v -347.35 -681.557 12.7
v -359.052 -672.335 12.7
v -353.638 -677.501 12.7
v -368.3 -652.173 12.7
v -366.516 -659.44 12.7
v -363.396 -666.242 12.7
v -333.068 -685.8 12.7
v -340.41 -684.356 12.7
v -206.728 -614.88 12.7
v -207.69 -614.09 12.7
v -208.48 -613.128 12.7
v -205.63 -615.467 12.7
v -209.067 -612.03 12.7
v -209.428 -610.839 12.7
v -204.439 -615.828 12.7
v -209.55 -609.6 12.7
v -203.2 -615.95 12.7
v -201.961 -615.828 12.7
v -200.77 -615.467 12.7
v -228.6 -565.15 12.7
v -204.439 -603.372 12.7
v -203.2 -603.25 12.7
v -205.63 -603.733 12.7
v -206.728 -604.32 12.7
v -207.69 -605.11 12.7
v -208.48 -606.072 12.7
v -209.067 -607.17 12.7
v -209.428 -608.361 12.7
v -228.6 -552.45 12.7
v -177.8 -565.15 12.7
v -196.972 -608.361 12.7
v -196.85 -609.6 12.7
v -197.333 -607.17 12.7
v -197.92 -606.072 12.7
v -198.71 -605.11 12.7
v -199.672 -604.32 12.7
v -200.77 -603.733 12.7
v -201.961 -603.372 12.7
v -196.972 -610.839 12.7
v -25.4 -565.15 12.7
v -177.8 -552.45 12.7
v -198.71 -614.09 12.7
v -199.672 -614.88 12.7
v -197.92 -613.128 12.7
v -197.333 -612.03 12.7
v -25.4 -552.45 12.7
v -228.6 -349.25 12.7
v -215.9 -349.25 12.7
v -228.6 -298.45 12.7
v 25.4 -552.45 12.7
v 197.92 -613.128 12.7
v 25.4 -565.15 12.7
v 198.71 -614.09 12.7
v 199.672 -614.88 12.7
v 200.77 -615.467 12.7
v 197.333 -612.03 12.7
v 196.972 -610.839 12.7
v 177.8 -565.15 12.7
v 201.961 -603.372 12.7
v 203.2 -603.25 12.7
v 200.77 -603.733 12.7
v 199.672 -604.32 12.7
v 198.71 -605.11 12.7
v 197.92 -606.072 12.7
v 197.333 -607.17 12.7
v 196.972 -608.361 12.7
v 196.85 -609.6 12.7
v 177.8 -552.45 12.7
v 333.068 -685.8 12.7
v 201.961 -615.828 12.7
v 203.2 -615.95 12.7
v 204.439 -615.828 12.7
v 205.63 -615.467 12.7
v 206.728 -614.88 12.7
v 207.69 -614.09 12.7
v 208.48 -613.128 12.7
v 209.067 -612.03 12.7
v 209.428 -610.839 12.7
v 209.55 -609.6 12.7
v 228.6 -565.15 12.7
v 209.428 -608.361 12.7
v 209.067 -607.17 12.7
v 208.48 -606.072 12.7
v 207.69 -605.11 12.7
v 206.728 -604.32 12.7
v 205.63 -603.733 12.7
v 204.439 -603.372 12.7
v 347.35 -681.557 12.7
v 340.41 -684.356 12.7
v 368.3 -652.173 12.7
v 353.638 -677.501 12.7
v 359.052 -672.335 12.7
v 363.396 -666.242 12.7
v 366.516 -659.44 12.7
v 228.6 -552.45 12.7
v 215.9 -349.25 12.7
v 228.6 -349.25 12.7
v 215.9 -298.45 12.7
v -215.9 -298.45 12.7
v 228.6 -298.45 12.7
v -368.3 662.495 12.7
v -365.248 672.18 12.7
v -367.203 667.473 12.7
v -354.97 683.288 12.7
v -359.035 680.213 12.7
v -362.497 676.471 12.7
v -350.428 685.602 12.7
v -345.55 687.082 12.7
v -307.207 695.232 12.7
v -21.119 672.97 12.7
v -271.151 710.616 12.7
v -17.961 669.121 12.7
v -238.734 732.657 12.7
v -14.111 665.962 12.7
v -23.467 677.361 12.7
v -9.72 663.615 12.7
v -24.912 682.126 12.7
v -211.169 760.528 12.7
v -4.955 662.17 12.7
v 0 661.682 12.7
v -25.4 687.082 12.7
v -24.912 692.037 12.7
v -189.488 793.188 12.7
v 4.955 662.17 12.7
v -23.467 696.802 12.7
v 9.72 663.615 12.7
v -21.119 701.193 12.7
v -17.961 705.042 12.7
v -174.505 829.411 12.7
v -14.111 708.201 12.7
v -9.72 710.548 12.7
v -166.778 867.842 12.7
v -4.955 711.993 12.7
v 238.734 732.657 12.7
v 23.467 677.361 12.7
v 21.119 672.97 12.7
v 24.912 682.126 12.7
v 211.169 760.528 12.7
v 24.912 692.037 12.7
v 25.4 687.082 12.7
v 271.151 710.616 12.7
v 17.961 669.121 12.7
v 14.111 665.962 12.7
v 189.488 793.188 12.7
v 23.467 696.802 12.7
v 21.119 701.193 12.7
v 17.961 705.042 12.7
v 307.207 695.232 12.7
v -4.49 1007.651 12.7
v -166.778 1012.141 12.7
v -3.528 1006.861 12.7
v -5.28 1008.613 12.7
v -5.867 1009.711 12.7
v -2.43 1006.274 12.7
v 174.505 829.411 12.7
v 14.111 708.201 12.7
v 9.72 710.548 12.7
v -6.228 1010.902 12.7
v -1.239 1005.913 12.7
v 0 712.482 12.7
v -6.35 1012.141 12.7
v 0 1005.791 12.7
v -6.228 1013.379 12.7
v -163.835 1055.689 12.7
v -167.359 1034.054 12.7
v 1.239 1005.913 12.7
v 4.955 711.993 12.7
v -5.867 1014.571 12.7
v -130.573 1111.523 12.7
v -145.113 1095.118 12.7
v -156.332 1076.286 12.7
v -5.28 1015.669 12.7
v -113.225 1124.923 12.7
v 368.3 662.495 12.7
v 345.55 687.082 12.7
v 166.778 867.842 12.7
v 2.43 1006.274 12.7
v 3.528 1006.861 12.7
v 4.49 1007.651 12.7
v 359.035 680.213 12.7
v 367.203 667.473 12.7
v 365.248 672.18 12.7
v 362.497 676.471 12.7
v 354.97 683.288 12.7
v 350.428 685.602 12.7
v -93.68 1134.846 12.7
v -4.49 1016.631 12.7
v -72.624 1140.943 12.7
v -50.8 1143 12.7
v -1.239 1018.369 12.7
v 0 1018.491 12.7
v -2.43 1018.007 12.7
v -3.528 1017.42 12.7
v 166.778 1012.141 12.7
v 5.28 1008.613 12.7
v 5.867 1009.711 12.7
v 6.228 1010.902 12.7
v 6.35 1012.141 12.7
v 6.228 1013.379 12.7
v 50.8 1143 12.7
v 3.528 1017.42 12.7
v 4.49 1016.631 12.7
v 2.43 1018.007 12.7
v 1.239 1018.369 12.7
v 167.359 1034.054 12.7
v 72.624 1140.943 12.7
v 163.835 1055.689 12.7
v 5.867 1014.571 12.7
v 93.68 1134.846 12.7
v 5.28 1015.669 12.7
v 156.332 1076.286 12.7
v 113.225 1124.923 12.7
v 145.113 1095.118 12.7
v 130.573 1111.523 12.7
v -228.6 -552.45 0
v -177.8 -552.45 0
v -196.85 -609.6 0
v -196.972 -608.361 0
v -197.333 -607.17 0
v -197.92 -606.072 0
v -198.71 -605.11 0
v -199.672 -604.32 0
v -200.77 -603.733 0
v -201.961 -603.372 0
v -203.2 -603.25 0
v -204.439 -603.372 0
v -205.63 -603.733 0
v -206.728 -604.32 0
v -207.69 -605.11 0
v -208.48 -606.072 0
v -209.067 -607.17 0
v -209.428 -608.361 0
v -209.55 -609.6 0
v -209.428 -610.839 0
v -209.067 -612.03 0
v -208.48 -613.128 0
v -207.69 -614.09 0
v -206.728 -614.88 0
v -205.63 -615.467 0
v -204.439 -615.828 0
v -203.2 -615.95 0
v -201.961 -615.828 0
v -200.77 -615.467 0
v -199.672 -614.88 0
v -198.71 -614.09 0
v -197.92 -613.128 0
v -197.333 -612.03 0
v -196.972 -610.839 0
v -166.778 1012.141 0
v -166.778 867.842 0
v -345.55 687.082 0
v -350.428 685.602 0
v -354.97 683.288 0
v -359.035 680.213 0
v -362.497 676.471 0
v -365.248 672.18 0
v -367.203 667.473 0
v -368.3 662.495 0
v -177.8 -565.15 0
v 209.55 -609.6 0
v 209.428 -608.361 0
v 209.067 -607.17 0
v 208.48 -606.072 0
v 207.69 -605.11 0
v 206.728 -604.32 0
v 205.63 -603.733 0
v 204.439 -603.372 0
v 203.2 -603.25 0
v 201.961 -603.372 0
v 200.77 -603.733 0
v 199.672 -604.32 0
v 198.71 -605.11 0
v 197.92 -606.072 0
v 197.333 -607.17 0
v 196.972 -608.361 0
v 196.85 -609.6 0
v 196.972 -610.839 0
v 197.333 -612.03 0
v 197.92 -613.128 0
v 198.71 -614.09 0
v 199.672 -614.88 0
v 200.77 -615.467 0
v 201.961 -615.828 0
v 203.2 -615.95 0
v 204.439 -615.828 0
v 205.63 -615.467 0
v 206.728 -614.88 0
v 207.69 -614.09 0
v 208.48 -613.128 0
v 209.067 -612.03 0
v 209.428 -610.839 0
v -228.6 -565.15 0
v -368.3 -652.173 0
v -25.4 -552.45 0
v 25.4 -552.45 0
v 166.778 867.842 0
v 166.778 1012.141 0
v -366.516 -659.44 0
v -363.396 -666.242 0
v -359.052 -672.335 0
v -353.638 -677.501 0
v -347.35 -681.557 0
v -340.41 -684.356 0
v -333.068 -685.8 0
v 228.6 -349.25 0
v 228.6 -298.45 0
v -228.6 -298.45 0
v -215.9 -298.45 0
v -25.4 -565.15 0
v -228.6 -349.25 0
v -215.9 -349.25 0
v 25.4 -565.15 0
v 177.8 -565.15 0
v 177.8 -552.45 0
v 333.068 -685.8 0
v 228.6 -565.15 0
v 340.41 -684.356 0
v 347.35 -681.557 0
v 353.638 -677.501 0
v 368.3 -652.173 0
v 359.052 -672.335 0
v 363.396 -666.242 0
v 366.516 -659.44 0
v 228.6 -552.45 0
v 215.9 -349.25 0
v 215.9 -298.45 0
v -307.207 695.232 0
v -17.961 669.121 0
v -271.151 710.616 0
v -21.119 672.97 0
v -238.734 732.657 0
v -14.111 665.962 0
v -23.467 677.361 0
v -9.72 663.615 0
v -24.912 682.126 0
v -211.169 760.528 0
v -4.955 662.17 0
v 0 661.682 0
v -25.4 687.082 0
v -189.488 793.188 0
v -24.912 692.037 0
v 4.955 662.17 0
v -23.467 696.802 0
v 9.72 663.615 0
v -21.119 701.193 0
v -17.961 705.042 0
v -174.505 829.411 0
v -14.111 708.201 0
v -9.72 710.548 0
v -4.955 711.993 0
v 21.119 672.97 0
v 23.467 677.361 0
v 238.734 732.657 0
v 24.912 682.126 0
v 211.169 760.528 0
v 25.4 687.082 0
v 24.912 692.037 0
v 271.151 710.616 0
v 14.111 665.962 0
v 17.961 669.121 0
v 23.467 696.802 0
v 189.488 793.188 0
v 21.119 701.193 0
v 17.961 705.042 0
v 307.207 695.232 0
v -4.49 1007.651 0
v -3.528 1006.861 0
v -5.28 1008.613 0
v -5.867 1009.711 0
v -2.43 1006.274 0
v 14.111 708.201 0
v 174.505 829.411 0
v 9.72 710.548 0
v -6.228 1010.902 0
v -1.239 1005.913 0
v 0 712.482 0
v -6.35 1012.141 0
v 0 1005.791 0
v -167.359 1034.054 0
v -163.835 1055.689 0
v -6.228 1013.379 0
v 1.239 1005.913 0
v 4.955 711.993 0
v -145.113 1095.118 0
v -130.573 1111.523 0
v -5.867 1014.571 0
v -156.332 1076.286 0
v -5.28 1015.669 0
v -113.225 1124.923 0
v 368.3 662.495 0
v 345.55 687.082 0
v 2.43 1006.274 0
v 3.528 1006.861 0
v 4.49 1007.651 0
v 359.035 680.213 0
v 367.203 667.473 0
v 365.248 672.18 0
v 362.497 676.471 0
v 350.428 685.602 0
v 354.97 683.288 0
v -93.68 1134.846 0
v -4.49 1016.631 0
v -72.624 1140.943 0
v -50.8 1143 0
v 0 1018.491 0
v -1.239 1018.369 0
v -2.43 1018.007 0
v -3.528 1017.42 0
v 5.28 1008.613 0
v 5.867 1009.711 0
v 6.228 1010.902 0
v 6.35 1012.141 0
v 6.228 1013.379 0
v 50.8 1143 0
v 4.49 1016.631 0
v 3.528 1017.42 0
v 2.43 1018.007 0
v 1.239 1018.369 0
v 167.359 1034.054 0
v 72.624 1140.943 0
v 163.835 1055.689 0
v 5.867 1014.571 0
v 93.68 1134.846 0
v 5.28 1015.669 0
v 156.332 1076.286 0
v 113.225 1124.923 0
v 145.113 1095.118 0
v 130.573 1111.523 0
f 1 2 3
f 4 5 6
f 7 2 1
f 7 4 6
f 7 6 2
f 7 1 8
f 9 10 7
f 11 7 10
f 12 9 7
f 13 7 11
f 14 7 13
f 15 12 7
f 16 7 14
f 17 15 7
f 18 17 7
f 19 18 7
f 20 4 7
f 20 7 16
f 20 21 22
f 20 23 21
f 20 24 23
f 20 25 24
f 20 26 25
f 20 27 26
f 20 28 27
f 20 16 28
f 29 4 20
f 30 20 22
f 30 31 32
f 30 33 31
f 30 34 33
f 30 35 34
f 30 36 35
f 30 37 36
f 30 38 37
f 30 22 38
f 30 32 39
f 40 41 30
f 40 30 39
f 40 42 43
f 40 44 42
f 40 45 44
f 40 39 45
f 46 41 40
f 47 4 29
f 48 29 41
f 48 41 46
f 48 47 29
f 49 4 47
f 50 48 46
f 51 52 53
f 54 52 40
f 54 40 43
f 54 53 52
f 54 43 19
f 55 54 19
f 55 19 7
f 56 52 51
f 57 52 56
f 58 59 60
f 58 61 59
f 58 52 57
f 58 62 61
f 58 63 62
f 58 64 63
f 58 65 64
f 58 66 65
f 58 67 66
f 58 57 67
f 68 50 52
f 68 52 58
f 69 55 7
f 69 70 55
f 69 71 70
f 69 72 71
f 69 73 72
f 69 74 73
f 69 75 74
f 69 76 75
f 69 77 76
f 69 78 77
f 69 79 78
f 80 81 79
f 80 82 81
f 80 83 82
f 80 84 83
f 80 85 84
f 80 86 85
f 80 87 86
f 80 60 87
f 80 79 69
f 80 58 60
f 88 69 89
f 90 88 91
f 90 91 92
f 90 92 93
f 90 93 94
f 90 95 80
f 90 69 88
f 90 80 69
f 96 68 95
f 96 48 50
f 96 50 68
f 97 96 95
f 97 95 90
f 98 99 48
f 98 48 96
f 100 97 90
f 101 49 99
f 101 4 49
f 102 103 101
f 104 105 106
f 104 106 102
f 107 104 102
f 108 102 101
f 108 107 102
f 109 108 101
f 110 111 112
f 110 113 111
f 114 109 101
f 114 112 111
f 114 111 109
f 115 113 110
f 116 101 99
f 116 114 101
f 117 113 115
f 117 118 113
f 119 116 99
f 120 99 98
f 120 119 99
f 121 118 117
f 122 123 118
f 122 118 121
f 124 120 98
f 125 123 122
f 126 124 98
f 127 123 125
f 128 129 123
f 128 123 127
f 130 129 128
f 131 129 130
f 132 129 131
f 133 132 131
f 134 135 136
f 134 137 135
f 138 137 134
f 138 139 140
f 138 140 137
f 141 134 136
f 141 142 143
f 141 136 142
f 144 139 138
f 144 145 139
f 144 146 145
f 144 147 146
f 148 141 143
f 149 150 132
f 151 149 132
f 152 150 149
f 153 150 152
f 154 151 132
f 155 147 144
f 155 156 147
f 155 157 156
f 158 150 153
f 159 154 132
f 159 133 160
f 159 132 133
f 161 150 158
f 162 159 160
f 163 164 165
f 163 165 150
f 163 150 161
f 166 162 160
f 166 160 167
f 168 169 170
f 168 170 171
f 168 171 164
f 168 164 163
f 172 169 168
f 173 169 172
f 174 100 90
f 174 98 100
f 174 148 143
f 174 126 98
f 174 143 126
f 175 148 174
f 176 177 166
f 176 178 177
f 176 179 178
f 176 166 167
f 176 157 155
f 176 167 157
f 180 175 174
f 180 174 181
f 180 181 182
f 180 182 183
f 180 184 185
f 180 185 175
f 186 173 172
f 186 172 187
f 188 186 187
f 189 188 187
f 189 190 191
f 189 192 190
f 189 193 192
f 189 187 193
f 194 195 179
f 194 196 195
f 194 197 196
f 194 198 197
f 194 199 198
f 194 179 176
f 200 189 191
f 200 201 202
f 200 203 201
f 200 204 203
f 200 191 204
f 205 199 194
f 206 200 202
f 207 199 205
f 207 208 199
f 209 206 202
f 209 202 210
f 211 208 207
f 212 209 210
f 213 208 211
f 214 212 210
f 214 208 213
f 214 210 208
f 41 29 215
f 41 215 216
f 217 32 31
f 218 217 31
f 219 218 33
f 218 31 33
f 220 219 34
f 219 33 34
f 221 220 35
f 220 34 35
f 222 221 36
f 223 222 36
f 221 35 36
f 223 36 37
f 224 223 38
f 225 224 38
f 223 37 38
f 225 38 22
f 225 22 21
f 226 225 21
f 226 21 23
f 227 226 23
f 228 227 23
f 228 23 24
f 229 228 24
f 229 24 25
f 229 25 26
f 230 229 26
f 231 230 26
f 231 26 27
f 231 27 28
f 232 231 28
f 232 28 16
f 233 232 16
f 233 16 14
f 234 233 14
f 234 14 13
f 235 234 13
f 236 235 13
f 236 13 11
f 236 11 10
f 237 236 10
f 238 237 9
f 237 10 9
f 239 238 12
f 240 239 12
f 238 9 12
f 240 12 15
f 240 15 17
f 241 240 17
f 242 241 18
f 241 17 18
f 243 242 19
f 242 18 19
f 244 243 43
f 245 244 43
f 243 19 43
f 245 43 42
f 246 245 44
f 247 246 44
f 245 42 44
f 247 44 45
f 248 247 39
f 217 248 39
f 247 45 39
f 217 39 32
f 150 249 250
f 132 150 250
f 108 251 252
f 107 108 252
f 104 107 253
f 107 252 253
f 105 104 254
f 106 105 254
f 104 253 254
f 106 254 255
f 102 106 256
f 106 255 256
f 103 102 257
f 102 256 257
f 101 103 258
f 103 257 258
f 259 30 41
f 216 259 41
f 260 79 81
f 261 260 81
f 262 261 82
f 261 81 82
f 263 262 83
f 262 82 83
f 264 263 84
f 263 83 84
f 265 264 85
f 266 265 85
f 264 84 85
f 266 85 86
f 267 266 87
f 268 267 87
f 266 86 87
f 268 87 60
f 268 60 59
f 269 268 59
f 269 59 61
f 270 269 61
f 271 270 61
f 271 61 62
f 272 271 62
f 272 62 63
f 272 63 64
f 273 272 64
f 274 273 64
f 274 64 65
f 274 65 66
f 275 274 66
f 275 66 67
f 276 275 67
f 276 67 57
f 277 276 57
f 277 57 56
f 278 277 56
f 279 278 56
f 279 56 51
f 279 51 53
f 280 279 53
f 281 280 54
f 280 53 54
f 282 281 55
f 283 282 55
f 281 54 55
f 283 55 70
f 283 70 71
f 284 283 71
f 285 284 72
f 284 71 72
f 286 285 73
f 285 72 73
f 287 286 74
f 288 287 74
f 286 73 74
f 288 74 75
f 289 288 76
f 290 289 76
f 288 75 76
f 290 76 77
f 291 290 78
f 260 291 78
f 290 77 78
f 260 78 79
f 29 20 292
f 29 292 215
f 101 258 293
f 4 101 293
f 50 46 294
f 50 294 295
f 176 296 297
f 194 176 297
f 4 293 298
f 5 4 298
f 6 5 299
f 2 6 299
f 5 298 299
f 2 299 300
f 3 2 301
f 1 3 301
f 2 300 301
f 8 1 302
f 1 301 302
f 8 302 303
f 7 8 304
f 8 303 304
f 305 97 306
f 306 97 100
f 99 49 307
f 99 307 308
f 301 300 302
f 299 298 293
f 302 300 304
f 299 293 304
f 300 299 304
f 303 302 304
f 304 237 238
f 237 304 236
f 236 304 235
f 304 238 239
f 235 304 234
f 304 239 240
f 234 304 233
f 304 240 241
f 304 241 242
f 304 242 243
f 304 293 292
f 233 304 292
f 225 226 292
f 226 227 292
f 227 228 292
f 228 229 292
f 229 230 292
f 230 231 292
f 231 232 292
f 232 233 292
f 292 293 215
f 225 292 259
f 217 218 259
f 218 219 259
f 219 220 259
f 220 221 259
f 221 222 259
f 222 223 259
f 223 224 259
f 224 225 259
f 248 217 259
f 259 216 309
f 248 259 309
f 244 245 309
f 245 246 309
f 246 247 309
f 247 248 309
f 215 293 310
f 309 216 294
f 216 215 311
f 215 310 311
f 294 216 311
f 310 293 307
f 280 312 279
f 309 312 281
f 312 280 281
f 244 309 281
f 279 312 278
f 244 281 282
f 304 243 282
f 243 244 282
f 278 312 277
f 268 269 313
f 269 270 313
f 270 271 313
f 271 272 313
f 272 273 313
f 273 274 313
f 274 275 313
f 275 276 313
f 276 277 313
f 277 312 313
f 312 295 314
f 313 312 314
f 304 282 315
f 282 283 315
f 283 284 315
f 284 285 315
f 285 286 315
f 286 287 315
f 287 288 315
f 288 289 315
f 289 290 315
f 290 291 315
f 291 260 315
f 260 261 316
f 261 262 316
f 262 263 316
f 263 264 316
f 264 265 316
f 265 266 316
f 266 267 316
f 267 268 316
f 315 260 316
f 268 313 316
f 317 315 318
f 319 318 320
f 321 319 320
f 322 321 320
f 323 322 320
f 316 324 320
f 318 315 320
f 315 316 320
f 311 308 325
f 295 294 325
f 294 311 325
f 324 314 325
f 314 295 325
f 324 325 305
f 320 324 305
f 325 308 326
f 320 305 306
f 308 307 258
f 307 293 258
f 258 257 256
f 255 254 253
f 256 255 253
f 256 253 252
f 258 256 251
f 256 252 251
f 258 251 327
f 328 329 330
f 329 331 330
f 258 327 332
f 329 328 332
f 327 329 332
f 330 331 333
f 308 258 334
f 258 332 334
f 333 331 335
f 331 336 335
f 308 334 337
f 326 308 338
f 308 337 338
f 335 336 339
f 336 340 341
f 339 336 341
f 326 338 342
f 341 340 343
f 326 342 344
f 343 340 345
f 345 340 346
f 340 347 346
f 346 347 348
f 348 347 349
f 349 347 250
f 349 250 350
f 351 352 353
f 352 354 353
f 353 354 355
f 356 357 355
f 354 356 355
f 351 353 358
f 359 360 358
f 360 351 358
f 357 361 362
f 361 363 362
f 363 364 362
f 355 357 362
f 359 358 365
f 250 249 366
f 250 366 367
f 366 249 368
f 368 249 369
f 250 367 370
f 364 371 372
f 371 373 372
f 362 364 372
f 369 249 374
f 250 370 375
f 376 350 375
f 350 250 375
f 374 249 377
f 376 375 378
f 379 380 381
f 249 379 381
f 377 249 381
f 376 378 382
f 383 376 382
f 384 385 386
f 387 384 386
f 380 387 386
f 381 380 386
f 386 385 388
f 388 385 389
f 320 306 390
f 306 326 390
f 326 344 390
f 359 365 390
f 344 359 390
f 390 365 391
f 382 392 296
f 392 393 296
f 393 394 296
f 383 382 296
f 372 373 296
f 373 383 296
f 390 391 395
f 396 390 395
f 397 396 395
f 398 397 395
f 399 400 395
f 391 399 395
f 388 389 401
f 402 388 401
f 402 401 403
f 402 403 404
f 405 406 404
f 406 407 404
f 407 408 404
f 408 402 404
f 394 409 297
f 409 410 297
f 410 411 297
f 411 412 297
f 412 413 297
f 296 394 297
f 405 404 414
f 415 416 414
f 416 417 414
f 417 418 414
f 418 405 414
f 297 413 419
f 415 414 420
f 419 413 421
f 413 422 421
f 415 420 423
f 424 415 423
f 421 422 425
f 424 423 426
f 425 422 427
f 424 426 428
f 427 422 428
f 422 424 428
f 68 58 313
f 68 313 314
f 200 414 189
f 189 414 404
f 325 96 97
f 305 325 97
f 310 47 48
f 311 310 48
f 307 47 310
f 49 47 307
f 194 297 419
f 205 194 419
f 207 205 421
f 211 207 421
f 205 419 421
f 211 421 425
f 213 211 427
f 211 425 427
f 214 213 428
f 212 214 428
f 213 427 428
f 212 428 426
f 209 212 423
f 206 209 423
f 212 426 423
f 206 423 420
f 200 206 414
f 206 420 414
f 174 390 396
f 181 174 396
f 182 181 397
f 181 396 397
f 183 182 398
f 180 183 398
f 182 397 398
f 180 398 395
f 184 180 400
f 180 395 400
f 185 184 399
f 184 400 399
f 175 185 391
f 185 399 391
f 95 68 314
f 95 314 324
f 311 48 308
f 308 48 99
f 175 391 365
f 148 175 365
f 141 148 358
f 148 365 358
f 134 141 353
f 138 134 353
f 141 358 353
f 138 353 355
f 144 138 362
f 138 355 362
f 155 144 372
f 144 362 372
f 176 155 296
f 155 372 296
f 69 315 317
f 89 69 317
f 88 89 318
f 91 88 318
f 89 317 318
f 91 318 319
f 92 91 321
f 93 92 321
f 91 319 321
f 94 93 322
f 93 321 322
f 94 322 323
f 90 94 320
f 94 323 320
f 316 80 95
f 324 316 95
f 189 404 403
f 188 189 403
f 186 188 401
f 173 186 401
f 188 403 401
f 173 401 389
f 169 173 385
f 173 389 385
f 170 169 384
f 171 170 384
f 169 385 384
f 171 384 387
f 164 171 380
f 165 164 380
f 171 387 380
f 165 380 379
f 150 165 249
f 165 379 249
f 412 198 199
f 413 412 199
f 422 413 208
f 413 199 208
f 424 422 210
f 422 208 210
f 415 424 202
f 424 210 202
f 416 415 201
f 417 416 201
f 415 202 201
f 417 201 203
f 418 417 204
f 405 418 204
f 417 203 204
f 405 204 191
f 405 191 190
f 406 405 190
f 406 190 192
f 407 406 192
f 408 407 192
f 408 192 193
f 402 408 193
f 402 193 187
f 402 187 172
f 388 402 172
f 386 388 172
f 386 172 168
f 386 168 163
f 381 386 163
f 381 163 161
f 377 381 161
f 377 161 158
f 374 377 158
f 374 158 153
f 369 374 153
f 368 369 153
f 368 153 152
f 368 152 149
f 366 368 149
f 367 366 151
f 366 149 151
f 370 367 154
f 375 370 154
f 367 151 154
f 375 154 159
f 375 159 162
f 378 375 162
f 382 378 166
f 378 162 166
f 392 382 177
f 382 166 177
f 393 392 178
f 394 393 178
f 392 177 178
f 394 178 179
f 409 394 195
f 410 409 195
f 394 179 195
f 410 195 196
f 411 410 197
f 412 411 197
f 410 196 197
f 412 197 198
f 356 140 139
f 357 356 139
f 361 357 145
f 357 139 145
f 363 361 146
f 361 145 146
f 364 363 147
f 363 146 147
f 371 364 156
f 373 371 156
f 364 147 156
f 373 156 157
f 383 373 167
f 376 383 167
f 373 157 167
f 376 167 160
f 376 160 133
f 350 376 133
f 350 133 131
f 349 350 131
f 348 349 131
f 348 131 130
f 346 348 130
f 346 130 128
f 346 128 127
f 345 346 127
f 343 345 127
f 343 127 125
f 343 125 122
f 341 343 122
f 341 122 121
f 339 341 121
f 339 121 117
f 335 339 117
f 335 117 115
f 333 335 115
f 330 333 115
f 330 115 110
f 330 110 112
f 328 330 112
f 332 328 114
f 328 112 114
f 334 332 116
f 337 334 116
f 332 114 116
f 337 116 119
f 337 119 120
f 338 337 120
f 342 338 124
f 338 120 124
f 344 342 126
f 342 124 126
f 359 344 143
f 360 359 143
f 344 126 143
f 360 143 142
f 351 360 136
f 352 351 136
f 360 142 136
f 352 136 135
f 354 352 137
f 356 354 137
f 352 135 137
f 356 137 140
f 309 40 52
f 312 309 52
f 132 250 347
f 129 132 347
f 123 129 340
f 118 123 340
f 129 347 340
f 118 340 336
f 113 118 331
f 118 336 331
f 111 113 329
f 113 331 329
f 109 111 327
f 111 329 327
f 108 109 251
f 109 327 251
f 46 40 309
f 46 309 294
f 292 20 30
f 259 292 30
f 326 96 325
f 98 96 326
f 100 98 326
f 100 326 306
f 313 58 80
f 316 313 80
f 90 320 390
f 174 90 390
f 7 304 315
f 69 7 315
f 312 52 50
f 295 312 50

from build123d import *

# Parameters (mm, degrees)
F1_DEPTH = 12.7
F2_R     = 6.35
F3_DEPTH = 25.4
F4_R     = 6.35
F5_DEPTH = 25.4
F6_R     = 25.4
F7_DEPTH = 25.4
F8_W     = 50.8
F8_H     = 12.7
F8_H_2   = 12.700023
F8_W_2   = 12.7
F8_H_3   = 50.8
F9_DEPTH = 25.4


with BuildPart() as f1:
    # F0 (on Top) → F1 (new body)
    with BuildSketch(Plane.XY):
        with BuildLine():
            Line((-333.067566, -685.8), (333.067566, -685.8))
            ThreePointArc((333.067566, -685.8), (356.467306, -675.046359), (368.3, -652.173317))
            Line((368.3, -652.173317), (368.3, 662.494829))
            ThreePointArc((368.3, 662.494829), (360.848675, 678.418518), (345.550371, 687.081542))
            ThreePointArc((345.550371, 687.081542), (224.27561, 745.924123), (166.778415, 867.842495))
            Line((166.778415, 867.842495), (166.778415, 1012.140632))
            ThreePointArc((166.778415, 1012.140632), (138.228781, 1103.662105), (50.8, 1143))
            Line((50.8, 1143), (0, 1143))
            Line((0, 1143), (-50.8, 1143))
            ThreePointArc((-50.8, 1143), (-138.228781, 1103.662105), (-166.778415, 1012.140632))
            Line((-166.778415, 1012.140632), (-166.778415, 867.842495))
            ThreePointArc((-166.778415, 867.842495), (-224.27561, 745.924123), (-345.550371, 687.081542))
            ThreePointArc((-345.550371, 687.081542), (-360.848675, 678.418518), (-368.3, 662.494829))
            Line((-368.3, 662.494829), (-368.3, -652.173317))
            ThreePointArc((-368.3, -652.173317), (-356.467306, -675.046359), (-333.067566, -685.8))
        make_face()
    extrude(amount=F1_DEPTH)

    # F2 (on face) → F3 (cut)
    with BuildSketch(Plane.XY.offset(12.7)):
        with Locations((0, 1012.140632)):
            Circle(F2_R)
    extrude(amount=-F3_DEPTH, mode=Mode.SUBTRACT)

    # F4 (on face) → F5 (cut)
    with BuildSketch(Plane.XY.offset(12.7)):
        with Locations((-203.2, -609.6)):
            Circle(F4_R)
        with Locations((203.2, -609.6)):
            Circle(F4_R)
    extrude(amount=-F5_DEPTH, mode=Mode.SUBTRACT)

    # F6 (on face) → F7 (cut)
    with BuildSketch(Plane.XY.offset(12.7)):
        with Locations((0, 687.081542)):
            Circle(F6_R)
    extrude(amount=-F7_DEPTH, mode=Mode.SUBTRACT)

    # F8 (on face) → F9 (cut)
    with BuildSketch(Plane.XY.offset(12.7)):
        with Locations((0, -558.8)):
            Rectangle(F8_W, F8_H)
        with Locations((-203.2, -558.800011)):
            Rectangle(F8_W, F8_H_2)
        with Locations((203.2, -558.800011)):
            Rectangle(F8_W, F8_H_2)
        with Locations((-222.25, -323.85)):
            Rectangle(F8_W_2, F8_H_3)
        with Locations((222.25, -323.85)):
            Rectangle(F8_W_2, F8_H_3)
    extrude(amount=-F9_DEPTH, mode=Mode.SUBTRACT)


solid = f1.part
